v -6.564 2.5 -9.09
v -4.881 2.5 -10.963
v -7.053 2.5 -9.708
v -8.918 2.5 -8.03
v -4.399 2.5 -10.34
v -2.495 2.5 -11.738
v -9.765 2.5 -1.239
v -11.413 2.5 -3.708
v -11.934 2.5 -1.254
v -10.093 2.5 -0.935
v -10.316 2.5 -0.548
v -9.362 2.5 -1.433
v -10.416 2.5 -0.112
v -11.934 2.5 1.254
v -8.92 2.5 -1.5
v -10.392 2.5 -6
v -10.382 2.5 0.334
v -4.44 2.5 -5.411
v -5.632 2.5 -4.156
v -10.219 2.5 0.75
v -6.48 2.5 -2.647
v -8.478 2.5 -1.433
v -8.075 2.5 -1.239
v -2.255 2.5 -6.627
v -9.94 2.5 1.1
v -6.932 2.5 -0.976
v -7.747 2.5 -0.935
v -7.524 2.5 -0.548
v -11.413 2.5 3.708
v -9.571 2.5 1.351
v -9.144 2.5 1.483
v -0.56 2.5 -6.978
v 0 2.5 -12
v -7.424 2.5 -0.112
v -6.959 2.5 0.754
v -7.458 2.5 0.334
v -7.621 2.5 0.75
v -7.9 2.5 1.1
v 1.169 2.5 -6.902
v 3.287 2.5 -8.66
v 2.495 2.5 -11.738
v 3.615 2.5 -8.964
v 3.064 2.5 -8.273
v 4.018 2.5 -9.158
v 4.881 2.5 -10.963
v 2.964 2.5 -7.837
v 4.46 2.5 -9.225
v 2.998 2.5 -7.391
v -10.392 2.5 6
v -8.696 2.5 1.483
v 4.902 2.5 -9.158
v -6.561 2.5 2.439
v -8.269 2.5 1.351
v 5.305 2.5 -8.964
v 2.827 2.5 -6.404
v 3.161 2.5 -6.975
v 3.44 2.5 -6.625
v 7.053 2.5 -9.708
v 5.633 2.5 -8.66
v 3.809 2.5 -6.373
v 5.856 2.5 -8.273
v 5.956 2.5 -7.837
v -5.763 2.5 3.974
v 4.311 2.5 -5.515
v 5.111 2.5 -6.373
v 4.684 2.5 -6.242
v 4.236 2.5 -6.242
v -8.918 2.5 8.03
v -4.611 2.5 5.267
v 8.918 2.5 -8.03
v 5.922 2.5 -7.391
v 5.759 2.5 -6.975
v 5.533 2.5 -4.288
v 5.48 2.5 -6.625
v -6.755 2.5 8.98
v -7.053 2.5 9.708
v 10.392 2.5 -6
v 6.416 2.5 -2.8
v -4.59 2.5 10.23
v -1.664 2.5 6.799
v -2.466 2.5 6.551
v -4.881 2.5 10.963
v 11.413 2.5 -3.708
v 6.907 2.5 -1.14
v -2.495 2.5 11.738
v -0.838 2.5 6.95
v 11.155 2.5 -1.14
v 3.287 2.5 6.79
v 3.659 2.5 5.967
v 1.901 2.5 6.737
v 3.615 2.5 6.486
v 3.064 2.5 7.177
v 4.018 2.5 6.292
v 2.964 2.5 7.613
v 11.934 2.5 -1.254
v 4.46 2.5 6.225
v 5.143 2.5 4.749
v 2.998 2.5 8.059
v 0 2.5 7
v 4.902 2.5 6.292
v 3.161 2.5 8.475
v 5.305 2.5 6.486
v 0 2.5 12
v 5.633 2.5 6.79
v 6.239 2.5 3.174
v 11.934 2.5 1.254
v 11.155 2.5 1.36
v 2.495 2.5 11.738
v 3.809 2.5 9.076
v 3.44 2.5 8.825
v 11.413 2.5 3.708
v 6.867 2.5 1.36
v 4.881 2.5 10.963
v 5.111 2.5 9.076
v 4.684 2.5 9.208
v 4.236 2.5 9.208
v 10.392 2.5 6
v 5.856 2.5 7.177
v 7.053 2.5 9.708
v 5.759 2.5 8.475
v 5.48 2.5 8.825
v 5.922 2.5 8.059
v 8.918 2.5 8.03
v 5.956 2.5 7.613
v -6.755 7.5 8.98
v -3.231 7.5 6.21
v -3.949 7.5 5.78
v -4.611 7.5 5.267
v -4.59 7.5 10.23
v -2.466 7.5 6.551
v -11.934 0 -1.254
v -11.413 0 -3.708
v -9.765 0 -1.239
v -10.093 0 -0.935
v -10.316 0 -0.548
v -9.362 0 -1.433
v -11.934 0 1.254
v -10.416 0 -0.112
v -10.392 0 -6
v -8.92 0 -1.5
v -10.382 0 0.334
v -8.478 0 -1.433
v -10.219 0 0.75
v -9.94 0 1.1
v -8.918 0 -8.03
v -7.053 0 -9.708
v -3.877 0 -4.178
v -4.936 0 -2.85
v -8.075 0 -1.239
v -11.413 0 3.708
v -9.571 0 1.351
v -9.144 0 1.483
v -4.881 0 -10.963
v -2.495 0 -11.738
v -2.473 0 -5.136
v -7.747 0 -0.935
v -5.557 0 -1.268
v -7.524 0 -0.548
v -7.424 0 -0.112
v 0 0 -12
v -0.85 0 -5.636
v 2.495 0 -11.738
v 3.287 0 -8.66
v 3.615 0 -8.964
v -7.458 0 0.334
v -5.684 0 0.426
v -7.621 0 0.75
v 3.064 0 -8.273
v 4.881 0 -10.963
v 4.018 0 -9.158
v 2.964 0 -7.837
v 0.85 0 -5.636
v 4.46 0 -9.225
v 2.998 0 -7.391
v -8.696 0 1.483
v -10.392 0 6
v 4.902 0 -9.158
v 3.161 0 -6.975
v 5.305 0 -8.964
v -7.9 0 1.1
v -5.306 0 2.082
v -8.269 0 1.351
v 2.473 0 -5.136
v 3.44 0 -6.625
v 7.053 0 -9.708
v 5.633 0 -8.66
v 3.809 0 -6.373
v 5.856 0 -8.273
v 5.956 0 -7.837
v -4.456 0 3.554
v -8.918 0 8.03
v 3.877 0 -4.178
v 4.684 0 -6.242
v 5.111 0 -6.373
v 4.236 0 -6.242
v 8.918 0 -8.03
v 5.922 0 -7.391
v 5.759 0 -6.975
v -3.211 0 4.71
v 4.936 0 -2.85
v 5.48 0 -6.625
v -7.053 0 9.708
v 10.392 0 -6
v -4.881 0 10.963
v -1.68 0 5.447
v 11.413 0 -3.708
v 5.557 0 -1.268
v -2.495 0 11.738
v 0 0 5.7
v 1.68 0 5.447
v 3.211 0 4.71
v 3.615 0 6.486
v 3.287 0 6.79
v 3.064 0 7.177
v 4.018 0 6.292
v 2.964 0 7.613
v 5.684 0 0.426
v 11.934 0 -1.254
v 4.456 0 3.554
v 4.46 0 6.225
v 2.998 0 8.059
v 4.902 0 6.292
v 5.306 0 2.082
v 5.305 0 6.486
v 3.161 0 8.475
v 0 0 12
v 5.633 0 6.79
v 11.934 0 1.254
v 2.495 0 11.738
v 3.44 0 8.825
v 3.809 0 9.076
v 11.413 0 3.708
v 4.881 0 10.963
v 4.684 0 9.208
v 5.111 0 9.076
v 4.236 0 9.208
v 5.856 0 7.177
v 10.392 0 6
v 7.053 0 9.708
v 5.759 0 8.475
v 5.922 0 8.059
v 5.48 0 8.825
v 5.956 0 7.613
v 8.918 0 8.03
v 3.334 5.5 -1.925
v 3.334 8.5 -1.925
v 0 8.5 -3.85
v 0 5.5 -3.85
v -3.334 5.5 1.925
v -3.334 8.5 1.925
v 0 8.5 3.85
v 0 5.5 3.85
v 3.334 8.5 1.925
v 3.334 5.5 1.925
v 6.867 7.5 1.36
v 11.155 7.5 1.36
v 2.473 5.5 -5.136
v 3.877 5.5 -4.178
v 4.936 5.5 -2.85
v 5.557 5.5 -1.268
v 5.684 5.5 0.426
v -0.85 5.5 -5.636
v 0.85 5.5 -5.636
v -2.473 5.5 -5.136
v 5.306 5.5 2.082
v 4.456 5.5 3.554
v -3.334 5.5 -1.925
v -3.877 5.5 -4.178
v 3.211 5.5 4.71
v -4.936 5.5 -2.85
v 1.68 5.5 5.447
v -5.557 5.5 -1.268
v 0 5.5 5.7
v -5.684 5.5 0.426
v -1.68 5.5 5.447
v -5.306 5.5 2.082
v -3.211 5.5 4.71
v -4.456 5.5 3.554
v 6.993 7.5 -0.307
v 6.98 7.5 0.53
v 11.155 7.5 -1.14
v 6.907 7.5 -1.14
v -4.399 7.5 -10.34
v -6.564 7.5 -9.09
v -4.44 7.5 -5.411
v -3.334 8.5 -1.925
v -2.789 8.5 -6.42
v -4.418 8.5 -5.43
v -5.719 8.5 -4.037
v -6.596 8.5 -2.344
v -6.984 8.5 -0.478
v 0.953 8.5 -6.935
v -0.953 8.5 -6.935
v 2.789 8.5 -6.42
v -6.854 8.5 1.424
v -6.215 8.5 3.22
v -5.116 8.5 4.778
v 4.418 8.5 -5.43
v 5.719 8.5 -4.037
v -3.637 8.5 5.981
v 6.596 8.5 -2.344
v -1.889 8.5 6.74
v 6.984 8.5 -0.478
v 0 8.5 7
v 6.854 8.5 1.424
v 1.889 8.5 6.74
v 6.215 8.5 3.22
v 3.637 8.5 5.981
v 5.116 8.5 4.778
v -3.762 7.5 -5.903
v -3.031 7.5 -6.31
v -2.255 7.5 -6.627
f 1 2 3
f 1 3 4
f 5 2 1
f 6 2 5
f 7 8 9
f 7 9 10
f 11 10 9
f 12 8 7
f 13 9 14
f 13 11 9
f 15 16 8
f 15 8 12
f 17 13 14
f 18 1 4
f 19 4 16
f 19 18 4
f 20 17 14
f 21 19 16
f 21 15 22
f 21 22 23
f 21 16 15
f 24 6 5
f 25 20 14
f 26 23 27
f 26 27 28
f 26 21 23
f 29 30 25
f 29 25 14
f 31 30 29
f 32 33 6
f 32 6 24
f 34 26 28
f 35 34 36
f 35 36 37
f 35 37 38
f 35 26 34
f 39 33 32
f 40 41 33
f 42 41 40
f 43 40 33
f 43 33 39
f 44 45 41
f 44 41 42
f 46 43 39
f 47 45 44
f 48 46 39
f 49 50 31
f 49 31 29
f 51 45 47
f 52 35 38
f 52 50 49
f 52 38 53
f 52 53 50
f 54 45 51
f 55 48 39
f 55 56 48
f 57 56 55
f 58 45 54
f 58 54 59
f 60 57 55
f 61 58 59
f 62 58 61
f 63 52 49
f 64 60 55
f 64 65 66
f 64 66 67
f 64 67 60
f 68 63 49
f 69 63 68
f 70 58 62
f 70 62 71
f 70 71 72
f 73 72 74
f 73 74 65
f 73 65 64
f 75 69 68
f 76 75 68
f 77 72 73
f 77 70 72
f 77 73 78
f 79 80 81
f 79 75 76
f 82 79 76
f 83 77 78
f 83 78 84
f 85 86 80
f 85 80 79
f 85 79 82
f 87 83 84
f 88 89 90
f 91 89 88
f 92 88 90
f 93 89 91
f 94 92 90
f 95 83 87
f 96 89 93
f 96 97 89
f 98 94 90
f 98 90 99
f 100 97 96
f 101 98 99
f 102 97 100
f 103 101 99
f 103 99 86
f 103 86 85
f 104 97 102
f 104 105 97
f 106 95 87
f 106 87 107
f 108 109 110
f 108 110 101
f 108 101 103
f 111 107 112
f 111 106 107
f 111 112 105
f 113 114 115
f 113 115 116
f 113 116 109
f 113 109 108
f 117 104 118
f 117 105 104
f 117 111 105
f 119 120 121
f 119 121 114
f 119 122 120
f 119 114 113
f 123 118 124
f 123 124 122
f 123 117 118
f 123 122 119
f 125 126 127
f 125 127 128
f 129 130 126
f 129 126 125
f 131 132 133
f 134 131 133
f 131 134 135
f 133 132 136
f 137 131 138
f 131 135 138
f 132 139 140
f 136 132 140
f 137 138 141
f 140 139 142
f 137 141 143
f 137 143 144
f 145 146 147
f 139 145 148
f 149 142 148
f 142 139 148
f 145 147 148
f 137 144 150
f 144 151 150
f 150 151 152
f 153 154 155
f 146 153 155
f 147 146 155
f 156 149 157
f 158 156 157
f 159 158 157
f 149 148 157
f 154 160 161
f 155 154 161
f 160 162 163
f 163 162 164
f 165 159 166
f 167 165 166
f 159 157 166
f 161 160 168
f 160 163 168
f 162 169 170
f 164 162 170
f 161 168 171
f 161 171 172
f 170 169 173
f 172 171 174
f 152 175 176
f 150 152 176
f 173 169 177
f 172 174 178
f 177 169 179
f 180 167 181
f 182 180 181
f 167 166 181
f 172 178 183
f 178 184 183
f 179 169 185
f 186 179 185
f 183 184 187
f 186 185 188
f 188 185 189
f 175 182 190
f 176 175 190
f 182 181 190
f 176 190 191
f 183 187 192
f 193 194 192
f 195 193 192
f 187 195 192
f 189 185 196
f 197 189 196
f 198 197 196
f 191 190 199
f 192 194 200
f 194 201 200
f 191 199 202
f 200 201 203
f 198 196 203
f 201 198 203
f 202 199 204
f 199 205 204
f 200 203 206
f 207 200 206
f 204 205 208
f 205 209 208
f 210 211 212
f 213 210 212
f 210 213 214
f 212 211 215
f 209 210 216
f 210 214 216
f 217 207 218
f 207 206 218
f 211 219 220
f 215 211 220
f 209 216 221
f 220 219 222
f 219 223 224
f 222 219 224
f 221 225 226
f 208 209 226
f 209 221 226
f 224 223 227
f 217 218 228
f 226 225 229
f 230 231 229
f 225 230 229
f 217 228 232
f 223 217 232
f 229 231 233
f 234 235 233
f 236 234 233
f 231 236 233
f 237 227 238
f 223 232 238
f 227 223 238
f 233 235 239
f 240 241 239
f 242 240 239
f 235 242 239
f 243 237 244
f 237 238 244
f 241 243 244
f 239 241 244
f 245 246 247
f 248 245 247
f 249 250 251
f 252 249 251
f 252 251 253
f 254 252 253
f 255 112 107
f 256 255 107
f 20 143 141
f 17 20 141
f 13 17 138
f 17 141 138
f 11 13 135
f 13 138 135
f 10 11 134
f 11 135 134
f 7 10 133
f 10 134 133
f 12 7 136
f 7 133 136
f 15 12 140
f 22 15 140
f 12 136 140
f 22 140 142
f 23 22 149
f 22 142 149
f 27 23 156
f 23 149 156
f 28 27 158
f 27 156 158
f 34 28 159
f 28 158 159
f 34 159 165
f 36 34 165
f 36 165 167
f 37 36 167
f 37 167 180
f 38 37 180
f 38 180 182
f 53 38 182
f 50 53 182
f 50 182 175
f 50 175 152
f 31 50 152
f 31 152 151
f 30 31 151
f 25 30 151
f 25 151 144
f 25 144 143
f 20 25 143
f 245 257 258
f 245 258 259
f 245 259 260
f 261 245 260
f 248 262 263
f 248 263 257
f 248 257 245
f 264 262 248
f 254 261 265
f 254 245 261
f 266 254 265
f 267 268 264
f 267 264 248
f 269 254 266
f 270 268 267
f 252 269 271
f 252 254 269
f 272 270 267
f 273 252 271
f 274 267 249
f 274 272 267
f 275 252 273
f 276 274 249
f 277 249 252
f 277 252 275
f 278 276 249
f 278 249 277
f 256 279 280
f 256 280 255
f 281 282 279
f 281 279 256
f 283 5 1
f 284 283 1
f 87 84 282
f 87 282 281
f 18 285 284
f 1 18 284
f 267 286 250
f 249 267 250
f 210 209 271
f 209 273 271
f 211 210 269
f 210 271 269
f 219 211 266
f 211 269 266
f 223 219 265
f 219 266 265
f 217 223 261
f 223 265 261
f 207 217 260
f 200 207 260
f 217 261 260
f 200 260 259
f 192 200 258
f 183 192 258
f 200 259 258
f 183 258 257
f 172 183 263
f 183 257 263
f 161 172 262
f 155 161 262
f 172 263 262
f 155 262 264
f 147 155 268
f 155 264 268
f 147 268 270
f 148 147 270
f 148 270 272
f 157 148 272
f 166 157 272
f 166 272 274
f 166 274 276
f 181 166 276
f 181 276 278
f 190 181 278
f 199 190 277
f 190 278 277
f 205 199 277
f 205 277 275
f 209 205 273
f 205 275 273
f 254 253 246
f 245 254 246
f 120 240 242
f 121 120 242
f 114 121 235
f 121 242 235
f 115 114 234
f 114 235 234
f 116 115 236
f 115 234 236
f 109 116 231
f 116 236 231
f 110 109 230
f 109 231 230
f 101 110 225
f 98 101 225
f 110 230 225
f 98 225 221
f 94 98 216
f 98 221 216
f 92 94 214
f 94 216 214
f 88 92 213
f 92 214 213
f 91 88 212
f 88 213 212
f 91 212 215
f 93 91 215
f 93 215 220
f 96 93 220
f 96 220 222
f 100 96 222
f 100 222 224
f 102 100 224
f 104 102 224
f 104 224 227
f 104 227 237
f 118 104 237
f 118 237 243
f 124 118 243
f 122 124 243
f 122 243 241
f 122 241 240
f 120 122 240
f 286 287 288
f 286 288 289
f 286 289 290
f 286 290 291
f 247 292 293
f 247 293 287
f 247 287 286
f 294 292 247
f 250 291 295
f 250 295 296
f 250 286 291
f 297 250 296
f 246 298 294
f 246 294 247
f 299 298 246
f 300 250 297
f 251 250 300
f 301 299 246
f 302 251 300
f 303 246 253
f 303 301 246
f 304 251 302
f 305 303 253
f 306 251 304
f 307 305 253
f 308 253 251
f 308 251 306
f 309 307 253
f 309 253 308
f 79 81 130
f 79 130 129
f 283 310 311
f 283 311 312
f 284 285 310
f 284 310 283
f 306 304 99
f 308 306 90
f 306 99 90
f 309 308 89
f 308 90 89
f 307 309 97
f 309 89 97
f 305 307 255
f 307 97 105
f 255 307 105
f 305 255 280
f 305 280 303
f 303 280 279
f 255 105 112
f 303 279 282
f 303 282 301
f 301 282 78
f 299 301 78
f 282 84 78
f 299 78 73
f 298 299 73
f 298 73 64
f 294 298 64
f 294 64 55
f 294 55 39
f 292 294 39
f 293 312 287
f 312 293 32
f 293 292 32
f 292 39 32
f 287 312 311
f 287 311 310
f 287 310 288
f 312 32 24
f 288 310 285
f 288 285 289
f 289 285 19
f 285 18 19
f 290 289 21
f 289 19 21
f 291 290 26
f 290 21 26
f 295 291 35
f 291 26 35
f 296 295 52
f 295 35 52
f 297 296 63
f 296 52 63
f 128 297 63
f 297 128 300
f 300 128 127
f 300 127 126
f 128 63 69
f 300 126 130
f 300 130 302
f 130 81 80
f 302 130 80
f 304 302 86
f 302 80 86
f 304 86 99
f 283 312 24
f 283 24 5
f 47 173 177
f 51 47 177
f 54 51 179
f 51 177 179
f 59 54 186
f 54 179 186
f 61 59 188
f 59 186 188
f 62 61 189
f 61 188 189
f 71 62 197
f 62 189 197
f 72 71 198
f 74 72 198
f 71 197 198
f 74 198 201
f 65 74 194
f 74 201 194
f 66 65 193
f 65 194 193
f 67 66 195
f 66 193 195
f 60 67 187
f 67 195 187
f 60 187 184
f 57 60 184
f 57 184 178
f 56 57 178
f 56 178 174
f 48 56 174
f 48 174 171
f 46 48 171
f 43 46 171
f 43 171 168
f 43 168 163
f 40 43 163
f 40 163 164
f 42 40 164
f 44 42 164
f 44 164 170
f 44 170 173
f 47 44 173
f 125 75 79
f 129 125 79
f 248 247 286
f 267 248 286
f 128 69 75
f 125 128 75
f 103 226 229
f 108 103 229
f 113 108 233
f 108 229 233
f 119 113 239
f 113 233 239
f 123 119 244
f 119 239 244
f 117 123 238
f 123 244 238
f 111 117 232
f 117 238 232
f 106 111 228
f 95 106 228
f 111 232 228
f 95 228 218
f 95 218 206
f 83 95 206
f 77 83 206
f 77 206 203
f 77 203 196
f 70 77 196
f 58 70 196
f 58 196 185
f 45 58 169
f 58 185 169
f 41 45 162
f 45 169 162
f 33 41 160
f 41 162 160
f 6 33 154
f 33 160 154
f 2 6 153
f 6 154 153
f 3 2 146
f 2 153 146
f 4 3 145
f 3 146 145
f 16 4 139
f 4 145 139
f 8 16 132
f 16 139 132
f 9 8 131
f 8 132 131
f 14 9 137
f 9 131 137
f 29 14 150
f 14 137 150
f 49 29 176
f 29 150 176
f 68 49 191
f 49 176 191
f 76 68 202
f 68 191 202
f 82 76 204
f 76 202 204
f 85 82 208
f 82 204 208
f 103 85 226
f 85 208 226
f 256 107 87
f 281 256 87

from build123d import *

# Parameters (mm, degrees)
SKETCH_1_R               = 12
EXTRUDE_1_DEPTH          = 2.5
SKETCH_2_R               = 5.7
CUT_EXTRUDE_1_DEPTH      = 2.5
SKETCH_3_R               = 7
EXTRUDE_2_DEPTH          = 6
CUT_EXTRUDE_3_DEPTH      = 19.980252896
CUT_EXTRUDE_START        = -3
SKETCH_6_R               = 5.7
CUT_EXTRUDE_4_DEPTH      = 3
SKETCH_12_R              = 1.5
CUT_EXTRUDE_7_DEPTH      = 8.5
PATTERN_CIRCULAR_3_COUNT = 3
SKETCH_16_W              = 4.841129394
SKETCH_16_H              = 2.5
EXTRUDE_5_DEPTH          = 5
PATTERN_CIRCULAR_4_COUNT = 3


with BuildPart() as part:
    # 草图1 → 凸台-拉伸1 (new body)
    with BuildSketch(Plane(origin=(0, 0, 0), x_dir=(1, 0, 0), z_dir=(0, 1, 0))):
        Circle(SKETCH_1_R)
    extrude(amount=EXTRUDE_1_DEPTH)

    # 草图2 → 切除-拉伸1 (cut)
    with BuildSketch(Plane(origin=(0, 2.5, 0), x_dir=(1, 0, 0), z_dir=(0, 1, 0))):
        Circle(SKETCH_2_R)
    extrude(amount=-CUT_EXTRUDE_1_DEPTH, mode=Mode.SUBTRACT)

    # 草图3 → 凸台-拉伸2 (add)
    with BuildSketch(Plane(origin=(0, 2.5, 0), x_dir=(1, 0, 0), z_dir=(0, 1, 0))):
        Circle(SKETCH_3_R)
    extrude(amount=EXTRUDE_2_DEPTH)

    # 草图5 → 切除-拉伸3 (cut, through all)
    with BuildSketch(Plane(origin=(0, 8.5, 0), x_dir=(1, 0, 0), z_dir=(0, 1, 0))):
        Polygon((3.334197805, -1.925), (3.334197805, 1.925), (0, 3.85), (-3.334197805, 1.925), (-3.334197805, -1.925), (0, -3.85), align=None)
    extrude(amount=-CUT_EXTRUDE_3_DEPTH, mode=Mode.SUBTRACT)

    # 草图6 → 切除-拉伸4 (cut)
    with BuildSketch(Plane.XZ.offset(-2.5).offset(CUT_EXTRUDE_START)):
        Circle(SKETCH_6_R)
    extrude(amount=CUT_EXTRUDE_4_DEPTH, mode=Mode.SUBTRACT)

    # 草图12 → 切除-拉伸7 (cut)
    with BuildSketch(Plane(origin=(0, 0, 0), x_dir=(-1, 0, 0), z_dir=(0, -1, 0))):
        with Locations((-4.46, 7.724946602)):
            Circle(SKETCH_12_R)
    cut_extrude_7 = extrude(amount=-CUT_EXTRUDE_7_DEPTH, mode=Mode.SUBTRACT)

    # 阵列(圆周)3: 切除-拉伸7 ×3 about axis
    pattern_circular_3_axis = Axis((0, 8.5, 0), (0, -1, 0))
    for i in range(1, PATTERN_CIRCULAR_3_COUNT):
        add(cut_extrude_7.rotate(pattern_circular_3_axis, i * 360 / PATTERN_CIRCULAR_3_COUNT), mode=Mode.SUBTRACT)

    # 草图16 → 凸台-拉伸5 (add)
    with BuildSketch(Plane(origin=(0, 2.5, 0), x_dir=(1, 0, 0), z_dir=(0, 1, 0))):
        with Locations((8.734133088, -0.110223506)):
            Rectangle(SKETCH_16_W, SKETCH_16_H)
    extrude_5 = extrude(amount=EXTRUDE_5_DEPTH)

    # 阵列(圆周)4: 凸台-拉伸5 ×3 about axis
    pattern_circular_4_axis = Axis((0, 8.5, 0), (0, -1, 0))
    for i in range(1, PATTERN_CIRCULAR_4_COUNT):
        add(extrude_5.rotate(pattern_circular_4_axis, i * 360 / PATTERN_CIRCULAR_4_COUNT))


solid = part.part
